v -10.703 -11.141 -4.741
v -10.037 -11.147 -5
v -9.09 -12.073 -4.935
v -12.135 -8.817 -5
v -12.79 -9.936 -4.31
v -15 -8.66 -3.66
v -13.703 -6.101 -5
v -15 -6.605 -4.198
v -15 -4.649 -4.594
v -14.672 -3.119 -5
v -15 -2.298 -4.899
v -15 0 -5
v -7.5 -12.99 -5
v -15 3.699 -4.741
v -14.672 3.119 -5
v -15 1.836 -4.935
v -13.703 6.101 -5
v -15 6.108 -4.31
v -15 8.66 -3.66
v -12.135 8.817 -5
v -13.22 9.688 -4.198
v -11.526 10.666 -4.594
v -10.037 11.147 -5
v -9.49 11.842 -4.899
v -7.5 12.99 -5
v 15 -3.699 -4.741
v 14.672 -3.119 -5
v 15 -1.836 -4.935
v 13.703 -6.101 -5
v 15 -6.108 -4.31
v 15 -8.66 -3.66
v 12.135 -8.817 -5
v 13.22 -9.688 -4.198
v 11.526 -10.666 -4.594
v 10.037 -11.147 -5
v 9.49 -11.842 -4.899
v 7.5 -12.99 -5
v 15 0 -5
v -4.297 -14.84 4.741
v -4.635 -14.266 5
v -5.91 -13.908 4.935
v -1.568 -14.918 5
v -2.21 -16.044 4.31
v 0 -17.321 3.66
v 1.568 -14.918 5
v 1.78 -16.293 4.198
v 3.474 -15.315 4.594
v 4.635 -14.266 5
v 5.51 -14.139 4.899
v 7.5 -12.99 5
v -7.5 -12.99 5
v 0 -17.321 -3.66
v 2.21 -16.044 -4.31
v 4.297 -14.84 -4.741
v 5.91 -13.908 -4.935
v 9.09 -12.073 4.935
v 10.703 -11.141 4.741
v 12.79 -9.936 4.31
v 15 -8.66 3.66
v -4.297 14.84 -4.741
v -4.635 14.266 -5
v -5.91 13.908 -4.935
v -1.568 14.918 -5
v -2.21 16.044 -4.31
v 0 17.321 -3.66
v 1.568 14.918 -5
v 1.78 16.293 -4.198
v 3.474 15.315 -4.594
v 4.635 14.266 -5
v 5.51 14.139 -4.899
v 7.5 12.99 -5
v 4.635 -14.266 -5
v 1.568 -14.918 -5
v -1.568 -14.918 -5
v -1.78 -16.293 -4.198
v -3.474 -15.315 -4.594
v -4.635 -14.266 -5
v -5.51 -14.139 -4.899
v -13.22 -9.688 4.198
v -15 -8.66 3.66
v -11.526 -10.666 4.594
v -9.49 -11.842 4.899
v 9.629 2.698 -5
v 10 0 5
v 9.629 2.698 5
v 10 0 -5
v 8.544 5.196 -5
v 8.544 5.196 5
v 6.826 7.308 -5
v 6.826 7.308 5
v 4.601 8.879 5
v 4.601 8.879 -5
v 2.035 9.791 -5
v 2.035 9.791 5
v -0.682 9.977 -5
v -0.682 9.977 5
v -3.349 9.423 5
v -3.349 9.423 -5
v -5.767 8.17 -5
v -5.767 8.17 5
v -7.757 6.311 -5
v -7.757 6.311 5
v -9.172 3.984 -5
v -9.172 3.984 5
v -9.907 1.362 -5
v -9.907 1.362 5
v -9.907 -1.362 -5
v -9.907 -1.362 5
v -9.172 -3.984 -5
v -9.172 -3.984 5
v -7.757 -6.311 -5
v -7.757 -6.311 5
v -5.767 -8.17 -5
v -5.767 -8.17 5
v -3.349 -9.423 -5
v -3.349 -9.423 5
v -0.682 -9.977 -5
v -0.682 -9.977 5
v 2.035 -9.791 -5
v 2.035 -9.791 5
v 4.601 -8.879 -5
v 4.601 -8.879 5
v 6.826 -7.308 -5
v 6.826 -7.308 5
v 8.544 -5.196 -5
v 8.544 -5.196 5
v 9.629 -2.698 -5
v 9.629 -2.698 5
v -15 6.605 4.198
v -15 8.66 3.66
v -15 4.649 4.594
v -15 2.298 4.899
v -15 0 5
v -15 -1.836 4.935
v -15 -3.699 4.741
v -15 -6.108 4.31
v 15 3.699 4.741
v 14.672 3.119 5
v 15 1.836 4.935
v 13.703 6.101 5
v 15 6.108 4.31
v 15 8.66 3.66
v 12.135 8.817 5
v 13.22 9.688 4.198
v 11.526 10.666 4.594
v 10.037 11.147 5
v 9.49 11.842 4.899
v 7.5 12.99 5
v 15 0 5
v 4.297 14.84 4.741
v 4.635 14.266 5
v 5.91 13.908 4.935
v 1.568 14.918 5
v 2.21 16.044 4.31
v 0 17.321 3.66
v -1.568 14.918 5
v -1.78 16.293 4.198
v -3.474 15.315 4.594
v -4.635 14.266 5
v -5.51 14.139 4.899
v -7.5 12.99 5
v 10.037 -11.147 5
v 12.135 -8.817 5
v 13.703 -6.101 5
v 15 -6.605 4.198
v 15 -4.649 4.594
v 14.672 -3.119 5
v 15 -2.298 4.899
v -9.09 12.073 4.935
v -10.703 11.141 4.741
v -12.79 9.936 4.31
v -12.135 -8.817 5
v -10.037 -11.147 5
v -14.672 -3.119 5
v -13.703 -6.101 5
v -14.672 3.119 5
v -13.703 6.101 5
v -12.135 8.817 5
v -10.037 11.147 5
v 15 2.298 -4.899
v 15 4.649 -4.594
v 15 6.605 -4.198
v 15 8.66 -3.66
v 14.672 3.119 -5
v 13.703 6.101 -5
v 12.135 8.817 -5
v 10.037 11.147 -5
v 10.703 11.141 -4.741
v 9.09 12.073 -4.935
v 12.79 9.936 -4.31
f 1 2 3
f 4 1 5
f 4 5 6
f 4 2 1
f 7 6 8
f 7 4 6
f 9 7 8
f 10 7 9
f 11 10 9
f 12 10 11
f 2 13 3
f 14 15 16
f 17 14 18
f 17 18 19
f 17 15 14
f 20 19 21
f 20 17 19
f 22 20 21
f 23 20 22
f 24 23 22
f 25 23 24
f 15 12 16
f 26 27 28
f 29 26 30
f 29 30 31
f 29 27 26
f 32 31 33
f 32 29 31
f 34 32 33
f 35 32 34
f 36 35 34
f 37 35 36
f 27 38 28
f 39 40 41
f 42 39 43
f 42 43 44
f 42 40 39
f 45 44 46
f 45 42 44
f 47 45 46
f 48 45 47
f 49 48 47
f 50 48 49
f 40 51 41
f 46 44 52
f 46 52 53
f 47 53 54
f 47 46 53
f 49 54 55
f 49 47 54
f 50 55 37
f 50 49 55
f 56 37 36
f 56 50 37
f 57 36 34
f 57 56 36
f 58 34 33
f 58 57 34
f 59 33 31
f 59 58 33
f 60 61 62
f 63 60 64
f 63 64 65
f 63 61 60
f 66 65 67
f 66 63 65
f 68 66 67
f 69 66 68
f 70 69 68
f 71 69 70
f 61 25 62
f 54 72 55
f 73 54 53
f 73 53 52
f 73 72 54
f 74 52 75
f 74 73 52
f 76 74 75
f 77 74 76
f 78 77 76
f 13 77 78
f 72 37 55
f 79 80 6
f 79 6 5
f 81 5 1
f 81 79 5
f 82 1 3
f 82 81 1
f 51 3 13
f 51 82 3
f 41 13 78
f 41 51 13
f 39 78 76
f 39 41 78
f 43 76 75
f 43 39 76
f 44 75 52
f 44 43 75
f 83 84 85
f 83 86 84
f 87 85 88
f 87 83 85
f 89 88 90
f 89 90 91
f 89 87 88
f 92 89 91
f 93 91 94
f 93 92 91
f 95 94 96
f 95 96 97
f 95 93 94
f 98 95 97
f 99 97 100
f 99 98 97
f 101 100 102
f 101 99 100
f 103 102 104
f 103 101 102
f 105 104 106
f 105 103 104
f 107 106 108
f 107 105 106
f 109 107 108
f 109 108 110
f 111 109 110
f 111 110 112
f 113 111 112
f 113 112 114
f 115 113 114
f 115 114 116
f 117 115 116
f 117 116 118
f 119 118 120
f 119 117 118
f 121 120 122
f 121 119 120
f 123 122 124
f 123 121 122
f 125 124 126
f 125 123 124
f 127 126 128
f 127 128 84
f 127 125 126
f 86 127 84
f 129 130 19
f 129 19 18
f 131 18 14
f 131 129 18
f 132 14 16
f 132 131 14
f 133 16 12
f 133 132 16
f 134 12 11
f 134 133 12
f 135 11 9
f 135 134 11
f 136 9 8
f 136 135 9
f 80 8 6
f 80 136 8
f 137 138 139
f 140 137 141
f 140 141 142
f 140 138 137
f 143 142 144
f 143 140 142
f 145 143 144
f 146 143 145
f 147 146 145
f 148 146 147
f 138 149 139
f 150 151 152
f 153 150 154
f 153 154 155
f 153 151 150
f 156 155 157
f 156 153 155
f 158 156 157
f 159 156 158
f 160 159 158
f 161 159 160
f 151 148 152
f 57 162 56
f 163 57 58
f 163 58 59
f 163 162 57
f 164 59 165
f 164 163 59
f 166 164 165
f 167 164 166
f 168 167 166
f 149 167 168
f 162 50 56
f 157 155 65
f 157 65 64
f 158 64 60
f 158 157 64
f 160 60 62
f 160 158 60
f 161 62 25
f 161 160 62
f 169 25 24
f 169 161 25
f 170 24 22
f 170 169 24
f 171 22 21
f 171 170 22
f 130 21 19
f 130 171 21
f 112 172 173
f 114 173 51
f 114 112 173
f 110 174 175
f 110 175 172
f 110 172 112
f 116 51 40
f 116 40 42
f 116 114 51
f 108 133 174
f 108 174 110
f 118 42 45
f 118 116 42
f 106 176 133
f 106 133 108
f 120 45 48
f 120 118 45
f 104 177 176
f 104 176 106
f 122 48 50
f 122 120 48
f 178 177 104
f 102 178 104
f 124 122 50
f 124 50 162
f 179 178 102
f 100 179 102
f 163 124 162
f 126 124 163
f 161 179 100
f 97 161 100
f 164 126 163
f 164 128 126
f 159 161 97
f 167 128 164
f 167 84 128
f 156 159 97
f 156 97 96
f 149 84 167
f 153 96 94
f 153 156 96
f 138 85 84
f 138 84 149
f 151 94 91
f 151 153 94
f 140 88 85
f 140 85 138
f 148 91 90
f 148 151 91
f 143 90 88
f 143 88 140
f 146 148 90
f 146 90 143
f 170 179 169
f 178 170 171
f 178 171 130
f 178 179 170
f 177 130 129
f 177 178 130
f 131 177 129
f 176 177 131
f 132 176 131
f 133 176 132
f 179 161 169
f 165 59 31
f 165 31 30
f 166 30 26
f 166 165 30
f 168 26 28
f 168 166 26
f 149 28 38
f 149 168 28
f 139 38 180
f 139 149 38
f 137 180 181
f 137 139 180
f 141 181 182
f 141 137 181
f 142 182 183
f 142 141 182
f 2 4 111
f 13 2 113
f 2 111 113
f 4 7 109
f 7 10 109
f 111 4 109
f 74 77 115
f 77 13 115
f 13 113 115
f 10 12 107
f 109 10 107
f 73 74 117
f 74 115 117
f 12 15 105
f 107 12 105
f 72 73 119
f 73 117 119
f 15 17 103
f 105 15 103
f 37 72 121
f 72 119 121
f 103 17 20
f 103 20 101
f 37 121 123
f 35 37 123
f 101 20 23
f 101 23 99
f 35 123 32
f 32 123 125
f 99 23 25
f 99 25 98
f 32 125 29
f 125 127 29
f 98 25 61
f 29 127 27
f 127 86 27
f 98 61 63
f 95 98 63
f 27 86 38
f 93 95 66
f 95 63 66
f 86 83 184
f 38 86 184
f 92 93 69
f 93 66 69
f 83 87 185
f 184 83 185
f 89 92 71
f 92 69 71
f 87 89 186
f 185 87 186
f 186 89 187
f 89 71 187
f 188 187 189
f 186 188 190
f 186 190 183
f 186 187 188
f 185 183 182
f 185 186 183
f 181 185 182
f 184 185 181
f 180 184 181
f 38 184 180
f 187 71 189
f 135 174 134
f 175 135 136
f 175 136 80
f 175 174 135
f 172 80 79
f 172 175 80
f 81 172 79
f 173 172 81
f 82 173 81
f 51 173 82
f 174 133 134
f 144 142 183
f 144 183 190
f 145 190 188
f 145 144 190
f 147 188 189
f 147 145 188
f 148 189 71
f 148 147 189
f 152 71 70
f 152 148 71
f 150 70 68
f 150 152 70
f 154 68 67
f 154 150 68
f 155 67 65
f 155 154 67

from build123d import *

# Parameters (mm, degrees)
SZKIC1_R                    = 10
DODANIE_WYCI_GNI_CIE1_DEPTH = 5
SZKIC2_OUTSIDE_W            = 76.022
SZKIC2_OUTSIDE_H            = 80.664
SZKIC2_OUTSIDE_R            = 15
WYTNIJ_WYCI_GNI_CIE2_DEPTH  = 10
WYTNIJ_WYCI_GNI_CIE2_DRAFT  = -60
LUSTRO1_COPY_1_SKETCH_W     = 76.022
LUSTRO1_COPY_1_SKETCH_H     = 80.664
LUSTRO1_COPY_1_SKETCH_R     = 15
LUSTRO1_COPY_1_DEPTH        = 10
LUSTRO1_COPY_1_DRAFT        = -60


with BuildPart() as part:
    # Szkic1 → Dodanie-wyciągnięcie1 (new, symmetric)
    with BuildSketch(Plane.XY):
        Polygon((-15, 8.660254038), (-15, -8.660254038), (0, -17.320508076), (15, -8.660254038), (15, 8.660254038), (0, 17.320508076), align=None)
        Circle(SZKIC1_R, mode=Mode.SUBTRACT)
    extrude(amount=DODANIE_WYCI_GNI_CIE1_DEPTH, both=True)


with BuildPart() as wytnij_wyci_gni_cie2_tool:
    # Szkic2 outside → Wytnij-wyciągnięcie2 (with draft: the straight prism first)
    with BuildSketch(Plane.XY.offset(5)):
        Rectangle(SZKIC2_OUTSIDE_W, SZKIC2_OUTSIDE_H)
        Circle(SZKIC2_OUTSIDE_R, mode=Mode.SUBTRACT)
    extrude(amount=-WYTNIJ_WYCI_GNI_CIE2_DEPTH)
    # Wytnij-wyciągnięcie2: the draft: its side faces are tilted about the plane it starts from
    wytnij_wyci_gni_cie2_sides = [wytnij_wyci_gni_cie2_tool.faces().sort_by_distance(p)[0] for p in [
        (0, -40.332, 0),
        (38.011, 0, 0),
        (0, 40.332, 0),
        (-38.011, 0, 0),
        (-15, 0, 0),
    ]]
    draft(wytnij_wyci_gni_cie2_sides, Plane.XY.offset(5), WYTNIJ_WYCI_GNI_CIE2_DRAFT)


with BuildPart() as part_1:
    add(part.part)

    # Wytnij-wyciągnięcie2: cut by wytnij_wyci_gni_cie2_tool
    add(wytnij_wyci_gni_cie2_tool.part, mode=Mode.SUBTRACT)


with BuildPart() as lustro1_copy_1_tool:
    # Lustro1 copy 1 sketch → Lustro1 copy 1 (with draft: the straight prism first)
    with BuildSketch(Plane(origin=(0, 0, -5), x_dir=(1, 0, 0), z_dir=(0, 0, -1))):
        Rectangle(LUSTRO1_COPY_1_SKETCH_W, LUSTRO1_COPY_1_SKETCH_H)
        Circle(LUSTRO1_COPY_1_SKETCH_R, mode=Mode.SUBTRACT)
    extrude(amount=-LUSTRO1_COPY_1_DEPTH)
    # Lustro1 copy 1: the draft: its side faces are tilted about the plane it starts from
    lustro1_copy_1_sides = [lustro1_copy_1_tool.faces().sort_by_distance(p)[0] for p in [
        (0, -40.332, 0),
        (38.011, 0, 0),
        (0, 40.332, 0),
        (-38.011, 0, 0),
        (-15, 0, 0),
    ]]
    draft(lustro1_copy_1_sides, Plane(origin=(0, 0, -5), x_dir=(1, 0, 0), z_dir=(0, 0, -1)), LUSTRO1_COPY_1_DRAFT)


with BuildPart() as part_2:
    add(part_1.part)

    # Lustro1 copy 1: cut by lustro1_copy_1_tool
    add(lustro1_copy_1_tool.part, mode=Mode.SUBTRACT)


solid = part_2.part
